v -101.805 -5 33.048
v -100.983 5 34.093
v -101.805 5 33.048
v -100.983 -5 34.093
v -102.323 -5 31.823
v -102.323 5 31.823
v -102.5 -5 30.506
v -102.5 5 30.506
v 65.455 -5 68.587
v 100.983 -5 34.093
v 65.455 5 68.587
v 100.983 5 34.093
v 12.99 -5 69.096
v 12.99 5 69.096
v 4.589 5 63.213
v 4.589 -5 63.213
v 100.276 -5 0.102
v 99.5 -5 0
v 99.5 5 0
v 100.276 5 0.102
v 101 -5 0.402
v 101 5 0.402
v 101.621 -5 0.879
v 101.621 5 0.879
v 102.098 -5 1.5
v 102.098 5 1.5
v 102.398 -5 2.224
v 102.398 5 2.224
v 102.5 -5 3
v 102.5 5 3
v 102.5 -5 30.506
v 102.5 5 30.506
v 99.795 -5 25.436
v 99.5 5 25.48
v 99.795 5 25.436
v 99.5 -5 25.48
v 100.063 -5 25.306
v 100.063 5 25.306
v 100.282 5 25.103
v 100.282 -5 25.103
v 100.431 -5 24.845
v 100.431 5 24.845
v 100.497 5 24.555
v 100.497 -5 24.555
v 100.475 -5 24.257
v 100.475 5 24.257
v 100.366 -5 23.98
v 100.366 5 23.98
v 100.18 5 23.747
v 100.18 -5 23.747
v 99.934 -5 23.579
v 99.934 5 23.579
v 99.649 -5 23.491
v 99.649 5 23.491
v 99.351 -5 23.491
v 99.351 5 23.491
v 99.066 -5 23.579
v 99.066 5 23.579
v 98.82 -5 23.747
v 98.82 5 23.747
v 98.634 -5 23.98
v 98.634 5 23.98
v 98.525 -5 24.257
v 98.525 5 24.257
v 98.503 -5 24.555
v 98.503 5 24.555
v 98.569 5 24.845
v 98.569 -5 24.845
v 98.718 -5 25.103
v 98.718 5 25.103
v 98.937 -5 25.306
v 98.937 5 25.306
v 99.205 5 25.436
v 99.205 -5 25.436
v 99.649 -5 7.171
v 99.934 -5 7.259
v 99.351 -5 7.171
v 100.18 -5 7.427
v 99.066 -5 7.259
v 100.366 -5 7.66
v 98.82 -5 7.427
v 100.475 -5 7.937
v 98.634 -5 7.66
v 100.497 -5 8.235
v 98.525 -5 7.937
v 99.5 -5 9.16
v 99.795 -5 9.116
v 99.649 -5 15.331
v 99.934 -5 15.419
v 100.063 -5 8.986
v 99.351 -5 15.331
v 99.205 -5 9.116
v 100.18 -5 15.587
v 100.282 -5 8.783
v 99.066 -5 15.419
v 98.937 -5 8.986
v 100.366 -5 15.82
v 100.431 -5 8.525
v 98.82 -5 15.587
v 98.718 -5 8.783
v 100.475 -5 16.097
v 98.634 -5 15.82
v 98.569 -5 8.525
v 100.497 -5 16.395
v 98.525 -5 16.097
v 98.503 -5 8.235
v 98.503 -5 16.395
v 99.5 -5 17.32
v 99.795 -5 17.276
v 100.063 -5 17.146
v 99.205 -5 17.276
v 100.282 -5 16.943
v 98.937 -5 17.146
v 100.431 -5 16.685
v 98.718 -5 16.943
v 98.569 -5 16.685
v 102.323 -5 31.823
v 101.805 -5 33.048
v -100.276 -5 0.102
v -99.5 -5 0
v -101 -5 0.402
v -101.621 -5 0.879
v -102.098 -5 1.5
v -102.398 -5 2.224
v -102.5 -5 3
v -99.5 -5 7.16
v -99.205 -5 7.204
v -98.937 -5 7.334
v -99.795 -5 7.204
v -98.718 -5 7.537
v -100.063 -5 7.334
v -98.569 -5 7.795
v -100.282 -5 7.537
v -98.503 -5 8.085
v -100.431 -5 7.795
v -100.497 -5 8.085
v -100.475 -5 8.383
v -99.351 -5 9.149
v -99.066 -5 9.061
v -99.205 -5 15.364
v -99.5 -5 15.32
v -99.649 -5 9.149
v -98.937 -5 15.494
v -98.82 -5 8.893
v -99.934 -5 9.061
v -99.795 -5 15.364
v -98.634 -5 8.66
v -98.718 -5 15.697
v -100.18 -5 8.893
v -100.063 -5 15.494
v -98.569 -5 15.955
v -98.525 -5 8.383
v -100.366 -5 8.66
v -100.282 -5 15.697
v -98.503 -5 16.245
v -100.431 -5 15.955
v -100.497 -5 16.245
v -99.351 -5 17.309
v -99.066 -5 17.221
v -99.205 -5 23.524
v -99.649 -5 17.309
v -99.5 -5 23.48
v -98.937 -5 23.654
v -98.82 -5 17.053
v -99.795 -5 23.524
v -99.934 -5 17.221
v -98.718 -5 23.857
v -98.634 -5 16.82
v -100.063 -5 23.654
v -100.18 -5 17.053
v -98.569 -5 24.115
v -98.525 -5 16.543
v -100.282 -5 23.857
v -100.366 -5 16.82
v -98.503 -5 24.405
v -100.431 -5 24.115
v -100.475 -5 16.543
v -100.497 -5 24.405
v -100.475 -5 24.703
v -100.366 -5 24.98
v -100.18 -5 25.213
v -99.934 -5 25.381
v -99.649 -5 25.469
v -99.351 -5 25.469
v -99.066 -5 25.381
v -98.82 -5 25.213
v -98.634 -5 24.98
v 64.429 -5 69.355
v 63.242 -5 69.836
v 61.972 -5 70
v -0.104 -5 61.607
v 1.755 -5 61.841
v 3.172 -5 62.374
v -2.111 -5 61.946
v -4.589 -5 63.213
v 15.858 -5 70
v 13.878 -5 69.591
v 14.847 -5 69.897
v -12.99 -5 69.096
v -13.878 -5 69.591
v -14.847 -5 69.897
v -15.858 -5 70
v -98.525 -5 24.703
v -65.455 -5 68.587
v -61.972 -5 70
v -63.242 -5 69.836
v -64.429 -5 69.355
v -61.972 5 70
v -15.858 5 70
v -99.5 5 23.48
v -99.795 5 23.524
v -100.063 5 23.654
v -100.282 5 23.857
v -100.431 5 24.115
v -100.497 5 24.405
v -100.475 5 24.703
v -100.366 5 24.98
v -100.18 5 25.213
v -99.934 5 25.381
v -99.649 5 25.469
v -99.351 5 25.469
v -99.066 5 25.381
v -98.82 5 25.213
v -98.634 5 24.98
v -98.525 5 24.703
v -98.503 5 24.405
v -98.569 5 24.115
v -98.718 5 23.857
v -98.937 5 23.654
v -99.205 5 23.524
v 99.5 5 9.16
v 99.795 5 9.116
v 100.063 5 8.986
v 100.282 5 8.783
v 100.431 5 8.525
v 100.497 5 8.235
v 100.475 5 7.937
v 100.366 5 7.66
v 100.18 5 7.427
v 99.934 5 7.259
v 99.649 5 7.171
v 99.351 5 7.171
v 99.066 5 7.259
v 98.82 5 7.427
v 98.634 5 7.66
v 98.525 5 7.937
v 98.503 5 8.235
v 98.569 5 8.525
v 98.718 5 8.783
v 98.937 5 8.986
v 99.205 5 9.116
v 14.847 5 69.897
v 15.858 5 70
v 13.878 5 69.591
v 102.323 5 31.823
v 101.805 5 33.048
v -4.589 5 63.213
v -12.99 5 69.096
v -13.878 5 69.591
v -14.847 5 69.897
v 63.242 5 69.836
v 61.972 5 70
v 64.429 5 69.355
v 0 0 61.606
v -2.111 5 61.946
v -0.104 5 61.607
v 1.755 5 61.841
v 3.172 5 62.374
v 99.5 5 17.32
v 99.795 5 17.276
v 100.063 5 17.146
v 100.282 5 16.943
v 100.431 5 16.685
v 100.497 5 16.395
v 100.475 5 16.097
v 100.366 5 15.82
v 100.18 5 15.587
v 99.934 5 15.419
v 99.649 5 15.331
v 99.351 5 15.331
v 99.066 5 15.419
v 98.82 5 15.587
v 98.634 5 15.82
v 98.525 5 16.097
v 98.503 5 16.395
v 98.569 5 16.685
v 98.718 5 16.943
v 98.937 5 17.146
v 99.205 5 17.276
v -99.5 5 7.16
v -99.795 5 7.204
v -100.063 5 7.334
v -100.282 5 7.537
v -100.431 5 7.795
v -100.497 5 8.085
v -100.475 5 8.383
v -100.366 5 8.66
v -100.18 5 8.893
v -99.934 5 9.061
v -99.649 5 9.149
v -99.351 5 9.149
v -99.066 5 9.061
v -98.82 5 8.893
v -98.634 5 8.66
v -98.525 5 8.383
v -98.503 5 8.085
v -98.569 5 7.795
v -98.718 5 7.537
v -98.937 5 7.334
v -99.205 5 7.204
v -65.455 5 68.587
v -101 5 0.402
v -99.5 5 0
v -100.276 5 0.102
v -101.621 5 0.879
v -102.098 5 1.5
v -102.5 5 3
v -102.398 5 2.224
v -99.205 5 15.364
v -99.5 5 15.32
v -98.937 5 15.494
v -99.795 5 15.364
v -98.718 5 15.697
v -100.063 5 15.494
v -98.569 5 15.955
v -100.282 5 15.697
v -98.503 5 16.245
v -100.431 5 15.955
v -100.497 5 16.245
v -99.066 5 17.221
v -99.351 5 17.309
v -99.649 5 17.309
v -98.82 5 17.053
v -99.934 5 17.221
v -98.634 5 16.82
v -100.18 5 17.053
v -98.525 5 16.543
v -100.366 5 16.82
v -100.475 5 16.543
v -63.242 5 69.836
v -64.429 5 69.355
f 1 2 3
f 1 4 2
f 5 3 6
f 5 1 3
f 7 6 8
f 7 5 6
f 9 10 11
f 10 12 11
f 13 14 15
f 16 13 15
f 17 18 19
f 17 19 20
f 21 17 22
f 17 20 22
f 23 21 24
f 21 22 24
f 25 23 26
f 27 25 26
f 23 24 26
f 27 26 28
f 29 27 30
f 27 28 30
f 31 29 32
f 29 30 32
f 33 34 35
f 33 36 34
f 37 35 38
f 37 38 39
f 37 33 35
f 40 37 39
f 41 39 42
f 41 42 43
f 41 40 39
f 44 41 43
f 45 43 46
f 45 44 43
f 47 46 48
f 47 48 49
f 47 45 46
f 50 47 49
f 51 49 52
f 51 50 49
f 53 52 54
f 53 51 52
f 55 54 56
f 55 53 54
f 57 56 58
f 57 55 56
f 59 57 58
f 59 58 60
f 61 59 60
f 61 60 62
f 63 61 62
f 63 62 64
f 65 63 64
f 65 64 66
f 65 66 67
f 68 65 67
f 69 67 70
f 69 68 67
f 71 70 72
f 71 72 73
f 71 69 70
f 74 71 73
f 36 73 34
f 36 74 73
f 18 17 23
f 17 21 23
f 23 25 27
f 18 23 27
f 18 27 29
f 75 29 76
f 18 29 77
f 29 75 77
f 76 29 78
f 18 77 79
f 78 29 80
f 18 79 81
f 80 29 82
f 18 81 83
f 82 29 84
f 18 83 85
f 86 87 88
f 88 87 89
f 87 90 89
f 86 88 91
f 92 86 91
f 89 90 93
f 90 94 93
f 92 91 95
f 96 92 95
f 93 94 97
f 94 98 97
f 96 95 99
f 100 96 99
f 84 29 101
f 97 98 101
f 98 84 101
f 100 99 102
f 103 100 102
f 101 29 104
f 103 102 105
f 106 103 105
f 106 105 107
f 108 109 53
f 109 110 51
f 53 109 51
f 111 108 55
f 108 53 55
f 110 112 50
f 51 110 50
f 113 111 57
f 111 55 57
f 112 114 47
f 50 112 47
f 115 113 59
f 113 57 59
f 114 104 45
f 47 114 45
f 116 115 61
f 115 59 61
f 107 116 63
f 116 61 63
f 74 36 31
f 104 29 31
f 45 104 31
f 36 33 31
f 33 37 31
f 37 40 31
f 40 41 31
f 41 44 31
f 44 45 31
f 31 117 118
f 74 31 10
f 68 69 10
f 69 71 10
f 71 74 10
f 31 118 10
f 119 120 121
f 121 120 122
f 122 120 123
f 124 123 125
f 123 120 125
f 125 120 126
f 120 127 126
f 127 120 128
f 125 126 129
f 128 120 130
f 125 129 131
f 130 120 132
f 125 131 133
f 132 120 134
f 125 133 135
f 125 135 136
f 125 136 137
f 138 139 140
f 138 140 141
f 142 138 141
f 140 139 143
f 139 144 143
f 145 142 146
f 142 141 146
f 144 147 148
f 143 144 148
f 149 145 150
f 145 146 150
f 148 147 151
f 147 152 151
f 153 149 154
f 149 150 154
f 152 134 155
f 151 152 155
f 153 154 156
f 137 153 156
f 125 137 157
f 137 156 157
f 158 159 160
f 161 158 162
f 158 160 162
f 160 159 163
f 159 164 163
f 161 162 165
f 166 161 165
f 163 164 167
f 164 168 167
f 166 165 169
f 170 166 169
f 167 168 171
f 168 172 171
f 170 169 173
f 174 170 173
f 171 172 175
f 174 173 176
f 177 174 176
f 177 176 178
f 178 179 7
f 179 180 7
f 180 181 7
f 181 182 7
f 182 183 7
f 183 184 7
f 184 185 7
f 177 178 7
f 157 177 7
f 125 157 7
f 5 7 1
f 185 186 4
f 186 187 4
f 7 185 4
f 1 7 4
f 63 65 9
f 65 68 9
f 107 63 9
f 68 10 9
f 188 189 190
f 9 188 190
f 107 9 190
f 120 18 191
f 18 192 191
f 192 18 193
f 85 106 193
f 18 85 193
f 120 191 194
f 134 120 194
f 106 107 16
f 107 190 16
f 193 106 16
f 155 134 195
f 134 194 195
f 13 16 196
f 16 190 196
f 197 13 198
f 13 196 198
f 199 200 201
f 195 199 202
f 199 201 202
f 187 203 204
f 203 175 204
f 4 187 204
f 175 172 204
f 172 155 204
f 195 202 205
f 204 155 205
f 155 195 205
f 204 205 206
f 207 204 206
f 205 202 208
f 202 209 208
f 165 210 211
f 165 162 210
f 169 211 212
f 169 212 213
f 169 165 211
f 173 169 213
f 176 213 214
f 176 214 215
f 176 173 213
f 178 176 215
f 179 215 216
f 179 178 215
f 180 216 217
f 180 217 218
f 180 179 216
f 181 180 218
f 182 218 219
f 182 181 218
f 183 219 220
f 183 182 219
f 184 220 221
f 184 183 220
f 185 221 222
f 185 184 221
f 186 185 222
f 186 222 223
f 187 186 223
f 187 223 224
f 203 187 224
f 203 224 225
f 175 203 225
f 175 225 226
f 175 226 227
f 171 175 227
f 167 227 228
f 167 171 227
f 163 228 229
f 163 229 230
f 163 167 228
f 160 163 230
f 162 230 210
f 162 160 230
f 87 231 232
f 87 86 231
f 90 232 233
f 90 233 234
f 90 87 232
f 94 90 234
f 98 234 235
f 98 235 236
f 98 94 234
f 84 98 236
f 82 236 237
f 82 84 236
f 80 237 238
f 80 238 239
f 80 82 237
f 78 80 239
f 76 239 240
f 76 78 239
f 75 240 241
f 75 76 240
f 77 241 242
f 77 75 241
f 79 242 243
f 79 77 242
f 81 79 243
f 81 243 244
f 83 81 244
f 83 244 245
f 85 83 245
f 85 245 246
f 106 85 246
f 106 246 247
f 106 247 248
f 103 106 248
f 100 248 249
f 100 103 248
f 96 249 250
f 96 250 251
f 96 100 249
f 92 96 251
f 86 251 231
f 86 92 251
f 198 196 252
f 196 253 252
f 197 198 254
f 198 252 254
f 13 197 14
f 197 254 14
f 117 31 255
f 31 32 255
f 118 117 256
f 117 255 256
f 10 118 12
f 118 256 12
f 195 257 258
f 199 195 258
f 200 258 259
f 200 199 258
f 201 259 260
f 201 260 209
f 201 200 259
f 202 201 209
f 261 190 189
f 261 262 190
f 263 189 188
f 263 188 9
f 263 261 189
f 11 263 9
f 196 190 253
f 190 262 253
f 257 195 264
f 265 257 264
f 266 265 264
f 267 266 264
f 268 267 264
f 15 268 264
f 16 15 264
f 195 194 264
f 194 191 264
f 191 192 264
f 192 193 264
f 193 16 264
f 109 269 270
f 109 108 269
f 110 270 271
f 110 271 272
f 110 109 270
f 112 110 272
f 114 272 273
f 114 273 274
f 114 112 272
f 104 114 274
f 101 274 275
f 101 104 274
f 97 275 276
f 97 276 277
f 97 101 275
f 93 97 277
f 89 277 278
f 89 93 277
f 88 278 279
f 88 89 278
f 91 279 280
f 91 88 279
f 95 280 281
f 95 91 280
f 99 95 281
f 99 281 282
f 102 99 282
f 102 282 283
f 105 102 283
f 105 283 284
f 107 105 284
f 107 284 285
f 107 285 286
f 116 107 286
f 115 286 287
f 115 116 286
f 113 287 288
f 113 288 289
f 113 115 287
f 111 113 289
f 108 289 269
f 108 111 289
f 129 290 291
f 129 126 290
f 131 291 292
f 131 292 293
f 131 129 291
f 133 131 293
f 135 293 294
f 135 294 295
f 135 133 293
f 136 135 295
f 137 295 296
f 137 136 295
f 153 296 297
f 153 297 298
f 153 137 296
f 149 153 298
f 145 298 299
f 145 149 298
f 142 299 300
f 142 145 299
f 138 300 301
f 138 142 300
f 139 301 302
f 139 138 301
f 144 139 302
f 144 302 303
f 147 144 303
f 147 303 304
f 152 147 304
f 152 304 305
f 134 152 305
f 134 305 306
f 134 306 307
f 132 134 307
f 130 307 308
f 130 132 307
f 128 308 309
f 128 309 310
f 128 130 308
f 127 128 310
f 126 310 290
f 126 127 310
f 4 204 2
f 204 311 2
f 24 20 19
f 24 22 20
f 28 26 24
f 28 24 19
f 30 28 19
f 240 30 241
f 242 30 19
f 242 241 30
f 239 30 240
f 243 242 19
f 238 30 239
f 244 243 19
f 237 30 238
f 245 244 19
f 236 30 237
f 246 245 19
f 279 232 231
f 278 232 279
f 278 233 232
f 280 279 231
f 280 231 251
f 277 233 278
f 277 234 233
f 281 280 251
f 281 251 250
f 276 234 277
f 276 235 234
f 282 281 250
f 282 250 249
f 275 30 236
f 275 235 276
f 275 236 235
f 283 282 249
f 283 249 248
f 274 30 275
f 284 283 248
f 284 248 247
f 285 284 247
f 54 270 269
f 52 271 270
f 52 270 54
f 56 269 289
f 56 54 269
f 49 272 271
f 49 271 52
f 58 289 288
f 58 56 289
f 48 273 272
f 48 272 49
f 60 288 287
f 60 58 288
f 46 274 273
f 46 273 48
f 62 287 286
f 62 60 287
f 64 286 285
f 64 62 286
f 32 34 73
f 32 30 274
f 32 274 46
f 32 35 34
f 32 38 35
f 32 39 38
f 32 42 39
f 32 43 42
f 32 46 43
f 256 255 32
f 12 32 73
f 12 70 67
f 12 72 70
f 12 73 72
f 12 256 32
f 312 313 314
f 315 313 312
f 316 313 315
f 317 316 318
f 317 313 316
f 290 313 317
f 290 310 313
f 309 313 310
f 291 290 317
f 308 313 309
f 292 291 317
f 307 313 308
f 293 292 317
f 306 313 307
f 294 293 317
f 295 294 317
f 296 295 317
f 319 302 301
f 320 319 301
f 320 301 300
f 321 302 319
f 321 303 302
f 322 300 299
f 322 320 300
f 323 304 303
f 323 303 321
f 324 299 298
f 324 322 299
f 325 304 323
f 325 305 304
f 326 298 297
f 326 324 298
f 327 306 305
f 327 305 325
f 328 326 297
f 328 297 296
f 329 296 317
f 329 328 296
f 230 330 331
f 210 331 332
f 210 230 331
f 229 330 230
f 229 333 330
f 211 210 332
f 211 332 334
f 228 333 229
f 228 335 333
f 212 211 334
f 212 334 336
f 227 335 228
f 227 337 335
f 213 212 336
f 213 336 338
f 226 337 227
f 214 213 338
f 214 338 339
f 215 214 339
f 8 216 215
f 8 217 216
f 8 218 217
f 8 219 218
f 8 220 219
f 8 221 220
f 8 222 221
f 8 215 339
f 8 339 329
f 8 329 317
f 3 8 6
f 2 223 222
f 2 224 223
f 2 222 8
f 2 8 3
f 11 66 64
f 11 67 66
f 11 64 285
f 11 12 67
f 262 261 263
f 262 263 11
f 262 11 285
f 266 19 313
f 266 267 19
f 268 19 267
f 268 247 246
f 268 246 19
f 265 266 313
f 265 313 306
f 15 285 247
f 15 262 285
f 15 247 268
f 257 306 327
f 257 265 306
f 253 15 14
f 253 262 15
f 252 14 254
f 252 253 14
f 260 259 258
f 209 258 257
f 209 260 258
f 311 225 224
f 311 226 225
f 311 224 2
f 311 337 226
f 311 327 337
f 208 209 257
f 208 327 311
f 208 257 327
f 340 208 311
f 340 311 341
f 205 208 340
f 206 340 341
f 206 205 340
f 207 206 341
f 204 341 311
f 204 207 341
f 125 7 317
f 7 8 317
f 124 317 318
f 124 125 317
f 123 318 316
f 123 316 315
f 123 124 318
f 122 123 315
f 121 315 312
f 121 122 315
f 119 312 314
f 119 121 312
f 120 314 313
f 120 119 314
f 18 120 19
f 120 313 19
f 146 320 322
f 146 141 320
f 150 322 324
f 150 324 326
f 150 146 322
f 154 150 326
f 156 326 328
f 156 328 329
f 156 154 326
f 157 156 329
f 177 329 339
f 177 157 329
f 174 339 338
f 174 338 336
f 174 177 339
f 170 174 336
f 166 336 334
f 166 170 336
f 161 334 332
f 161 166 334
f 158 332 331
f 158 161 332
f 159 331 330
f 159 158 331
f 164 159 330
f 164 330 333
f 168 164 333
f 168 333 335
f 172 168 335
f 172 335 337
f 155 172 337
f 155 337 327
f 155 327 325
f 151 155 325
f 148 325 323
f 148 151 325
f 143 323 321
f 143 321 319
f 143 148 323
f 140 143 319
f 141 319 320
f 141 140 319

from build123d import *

# Parameters (mm, degrees)
SKETCH1_R           = 1
BOSS_EXTRUDE1_DEPTH = 5
FILLET1_R           = 5
FILLET2_R           = 5
FILLET3_R           = 5
FILLET4_R           = 3


with BuildPart() as part:
    # Sketch1 → Boss-Extrude1 (new, symmetric)
    with BuildSketch(Plane(origin=(0, 0, 0), x_dir=(1, 0, 0), z_dir=(0, 1, 0))):
        Polygon((0, -60), (-14.281480067, -70), (-64, -70), (-102.5, -32.62), (-102.5, 0), (102.5, 0), (102.5, -32.62), (64, -70), (14.281480067, -70), align=None)
        with Locations(Location((99.5, -8.16, 0), (0, 0, 270))):
            Circle(SKETCH1_R, mode=Mode.SUBTRACT)
        with Locations(Location((99.5, -16.32, 0), (0, 0, 270))):
            Circle(SKETCH1_R, mode=Mode.SUBTRACT)
        with Locations(Location((99.5, -24.48, 0), (0, 0, 270))):
            Circle(SKETCH1_R, mode=Mode.SUBTRACT)
        with Locations(Location((-99.5, -24.48, 0), (0, 0, 90))):
            Circle(SKETCH1_R, mode=Mode.SUBTRACT)
        with Locations(Location((-99.5, -16.32, 0), (0, 0, 90))):
            Circle(SKETCH1_R, mode=Mode.SUBTRACT)
        with Locations(Location((-99.5, -8.16, 0), (0, 0, 90))):
            Circle(SKETCH1_R, mode=Mode.SUBTRACT)
    extrude(amount=BOSS_EXTRUDE1_DEPTH, both=True)

    # Fillet1
    fillet1_edges = [part.edges().sort_by_distance(p)[0] for p in [
        (-14.281480067, 0, 70),
        (14.281480067, 0, 70),
    ]]
    fillet(fillet1_edges, radius=FILLET1_R)

    # Fillet2
    fillet2_edges = [part.edges().sort_by_distance(p)[0] for p in [
        (-64, 0, 70),
        (64, 0, 70),
    ]]
    fillet(fillet2_edges, radius=FILLET2_R)

    # Fillet3
    fillet3_edges = [part.edges().sort_by_distance(p)[0] for p in [
        (-102.5, 0, 32.62),
        (102.5, 0, 32.62),
    ]]
    fillet(fillet3_edges, radius=FILLET3_R)

    # Fillet4
    fillet4_edges = [part.edges().sort_by_distance(p)[0] for p in [
        (-102.5, 0, 0),
        (102.5, 0, 0),
    ]]
    fillet(fillet4_edges, radius=FILLET4_R)

    # Fillet5
    # a fillet whose section is not a circle: 8 mm, written as the material it adds along each edge
    with BuildSketch(Plane(origin=(0, -5, 60), x_dir=(-0.8191520442889911, 0, 0.5735764363510473), z_dir=(0, 1, 0))) as fillet5_piece_1:
        with BuildLine():
            Bezier((5.601660306, 0), (0, 0), (-1.915880661, 5.263838853), weights=[1, 1, 1])
            Line((-1.915880661, 5.263838853), (0, 0))
            Line((0, 0), (5.601660306, 0))
        make_face()
    extrude(amount=10)


solid = part.part
